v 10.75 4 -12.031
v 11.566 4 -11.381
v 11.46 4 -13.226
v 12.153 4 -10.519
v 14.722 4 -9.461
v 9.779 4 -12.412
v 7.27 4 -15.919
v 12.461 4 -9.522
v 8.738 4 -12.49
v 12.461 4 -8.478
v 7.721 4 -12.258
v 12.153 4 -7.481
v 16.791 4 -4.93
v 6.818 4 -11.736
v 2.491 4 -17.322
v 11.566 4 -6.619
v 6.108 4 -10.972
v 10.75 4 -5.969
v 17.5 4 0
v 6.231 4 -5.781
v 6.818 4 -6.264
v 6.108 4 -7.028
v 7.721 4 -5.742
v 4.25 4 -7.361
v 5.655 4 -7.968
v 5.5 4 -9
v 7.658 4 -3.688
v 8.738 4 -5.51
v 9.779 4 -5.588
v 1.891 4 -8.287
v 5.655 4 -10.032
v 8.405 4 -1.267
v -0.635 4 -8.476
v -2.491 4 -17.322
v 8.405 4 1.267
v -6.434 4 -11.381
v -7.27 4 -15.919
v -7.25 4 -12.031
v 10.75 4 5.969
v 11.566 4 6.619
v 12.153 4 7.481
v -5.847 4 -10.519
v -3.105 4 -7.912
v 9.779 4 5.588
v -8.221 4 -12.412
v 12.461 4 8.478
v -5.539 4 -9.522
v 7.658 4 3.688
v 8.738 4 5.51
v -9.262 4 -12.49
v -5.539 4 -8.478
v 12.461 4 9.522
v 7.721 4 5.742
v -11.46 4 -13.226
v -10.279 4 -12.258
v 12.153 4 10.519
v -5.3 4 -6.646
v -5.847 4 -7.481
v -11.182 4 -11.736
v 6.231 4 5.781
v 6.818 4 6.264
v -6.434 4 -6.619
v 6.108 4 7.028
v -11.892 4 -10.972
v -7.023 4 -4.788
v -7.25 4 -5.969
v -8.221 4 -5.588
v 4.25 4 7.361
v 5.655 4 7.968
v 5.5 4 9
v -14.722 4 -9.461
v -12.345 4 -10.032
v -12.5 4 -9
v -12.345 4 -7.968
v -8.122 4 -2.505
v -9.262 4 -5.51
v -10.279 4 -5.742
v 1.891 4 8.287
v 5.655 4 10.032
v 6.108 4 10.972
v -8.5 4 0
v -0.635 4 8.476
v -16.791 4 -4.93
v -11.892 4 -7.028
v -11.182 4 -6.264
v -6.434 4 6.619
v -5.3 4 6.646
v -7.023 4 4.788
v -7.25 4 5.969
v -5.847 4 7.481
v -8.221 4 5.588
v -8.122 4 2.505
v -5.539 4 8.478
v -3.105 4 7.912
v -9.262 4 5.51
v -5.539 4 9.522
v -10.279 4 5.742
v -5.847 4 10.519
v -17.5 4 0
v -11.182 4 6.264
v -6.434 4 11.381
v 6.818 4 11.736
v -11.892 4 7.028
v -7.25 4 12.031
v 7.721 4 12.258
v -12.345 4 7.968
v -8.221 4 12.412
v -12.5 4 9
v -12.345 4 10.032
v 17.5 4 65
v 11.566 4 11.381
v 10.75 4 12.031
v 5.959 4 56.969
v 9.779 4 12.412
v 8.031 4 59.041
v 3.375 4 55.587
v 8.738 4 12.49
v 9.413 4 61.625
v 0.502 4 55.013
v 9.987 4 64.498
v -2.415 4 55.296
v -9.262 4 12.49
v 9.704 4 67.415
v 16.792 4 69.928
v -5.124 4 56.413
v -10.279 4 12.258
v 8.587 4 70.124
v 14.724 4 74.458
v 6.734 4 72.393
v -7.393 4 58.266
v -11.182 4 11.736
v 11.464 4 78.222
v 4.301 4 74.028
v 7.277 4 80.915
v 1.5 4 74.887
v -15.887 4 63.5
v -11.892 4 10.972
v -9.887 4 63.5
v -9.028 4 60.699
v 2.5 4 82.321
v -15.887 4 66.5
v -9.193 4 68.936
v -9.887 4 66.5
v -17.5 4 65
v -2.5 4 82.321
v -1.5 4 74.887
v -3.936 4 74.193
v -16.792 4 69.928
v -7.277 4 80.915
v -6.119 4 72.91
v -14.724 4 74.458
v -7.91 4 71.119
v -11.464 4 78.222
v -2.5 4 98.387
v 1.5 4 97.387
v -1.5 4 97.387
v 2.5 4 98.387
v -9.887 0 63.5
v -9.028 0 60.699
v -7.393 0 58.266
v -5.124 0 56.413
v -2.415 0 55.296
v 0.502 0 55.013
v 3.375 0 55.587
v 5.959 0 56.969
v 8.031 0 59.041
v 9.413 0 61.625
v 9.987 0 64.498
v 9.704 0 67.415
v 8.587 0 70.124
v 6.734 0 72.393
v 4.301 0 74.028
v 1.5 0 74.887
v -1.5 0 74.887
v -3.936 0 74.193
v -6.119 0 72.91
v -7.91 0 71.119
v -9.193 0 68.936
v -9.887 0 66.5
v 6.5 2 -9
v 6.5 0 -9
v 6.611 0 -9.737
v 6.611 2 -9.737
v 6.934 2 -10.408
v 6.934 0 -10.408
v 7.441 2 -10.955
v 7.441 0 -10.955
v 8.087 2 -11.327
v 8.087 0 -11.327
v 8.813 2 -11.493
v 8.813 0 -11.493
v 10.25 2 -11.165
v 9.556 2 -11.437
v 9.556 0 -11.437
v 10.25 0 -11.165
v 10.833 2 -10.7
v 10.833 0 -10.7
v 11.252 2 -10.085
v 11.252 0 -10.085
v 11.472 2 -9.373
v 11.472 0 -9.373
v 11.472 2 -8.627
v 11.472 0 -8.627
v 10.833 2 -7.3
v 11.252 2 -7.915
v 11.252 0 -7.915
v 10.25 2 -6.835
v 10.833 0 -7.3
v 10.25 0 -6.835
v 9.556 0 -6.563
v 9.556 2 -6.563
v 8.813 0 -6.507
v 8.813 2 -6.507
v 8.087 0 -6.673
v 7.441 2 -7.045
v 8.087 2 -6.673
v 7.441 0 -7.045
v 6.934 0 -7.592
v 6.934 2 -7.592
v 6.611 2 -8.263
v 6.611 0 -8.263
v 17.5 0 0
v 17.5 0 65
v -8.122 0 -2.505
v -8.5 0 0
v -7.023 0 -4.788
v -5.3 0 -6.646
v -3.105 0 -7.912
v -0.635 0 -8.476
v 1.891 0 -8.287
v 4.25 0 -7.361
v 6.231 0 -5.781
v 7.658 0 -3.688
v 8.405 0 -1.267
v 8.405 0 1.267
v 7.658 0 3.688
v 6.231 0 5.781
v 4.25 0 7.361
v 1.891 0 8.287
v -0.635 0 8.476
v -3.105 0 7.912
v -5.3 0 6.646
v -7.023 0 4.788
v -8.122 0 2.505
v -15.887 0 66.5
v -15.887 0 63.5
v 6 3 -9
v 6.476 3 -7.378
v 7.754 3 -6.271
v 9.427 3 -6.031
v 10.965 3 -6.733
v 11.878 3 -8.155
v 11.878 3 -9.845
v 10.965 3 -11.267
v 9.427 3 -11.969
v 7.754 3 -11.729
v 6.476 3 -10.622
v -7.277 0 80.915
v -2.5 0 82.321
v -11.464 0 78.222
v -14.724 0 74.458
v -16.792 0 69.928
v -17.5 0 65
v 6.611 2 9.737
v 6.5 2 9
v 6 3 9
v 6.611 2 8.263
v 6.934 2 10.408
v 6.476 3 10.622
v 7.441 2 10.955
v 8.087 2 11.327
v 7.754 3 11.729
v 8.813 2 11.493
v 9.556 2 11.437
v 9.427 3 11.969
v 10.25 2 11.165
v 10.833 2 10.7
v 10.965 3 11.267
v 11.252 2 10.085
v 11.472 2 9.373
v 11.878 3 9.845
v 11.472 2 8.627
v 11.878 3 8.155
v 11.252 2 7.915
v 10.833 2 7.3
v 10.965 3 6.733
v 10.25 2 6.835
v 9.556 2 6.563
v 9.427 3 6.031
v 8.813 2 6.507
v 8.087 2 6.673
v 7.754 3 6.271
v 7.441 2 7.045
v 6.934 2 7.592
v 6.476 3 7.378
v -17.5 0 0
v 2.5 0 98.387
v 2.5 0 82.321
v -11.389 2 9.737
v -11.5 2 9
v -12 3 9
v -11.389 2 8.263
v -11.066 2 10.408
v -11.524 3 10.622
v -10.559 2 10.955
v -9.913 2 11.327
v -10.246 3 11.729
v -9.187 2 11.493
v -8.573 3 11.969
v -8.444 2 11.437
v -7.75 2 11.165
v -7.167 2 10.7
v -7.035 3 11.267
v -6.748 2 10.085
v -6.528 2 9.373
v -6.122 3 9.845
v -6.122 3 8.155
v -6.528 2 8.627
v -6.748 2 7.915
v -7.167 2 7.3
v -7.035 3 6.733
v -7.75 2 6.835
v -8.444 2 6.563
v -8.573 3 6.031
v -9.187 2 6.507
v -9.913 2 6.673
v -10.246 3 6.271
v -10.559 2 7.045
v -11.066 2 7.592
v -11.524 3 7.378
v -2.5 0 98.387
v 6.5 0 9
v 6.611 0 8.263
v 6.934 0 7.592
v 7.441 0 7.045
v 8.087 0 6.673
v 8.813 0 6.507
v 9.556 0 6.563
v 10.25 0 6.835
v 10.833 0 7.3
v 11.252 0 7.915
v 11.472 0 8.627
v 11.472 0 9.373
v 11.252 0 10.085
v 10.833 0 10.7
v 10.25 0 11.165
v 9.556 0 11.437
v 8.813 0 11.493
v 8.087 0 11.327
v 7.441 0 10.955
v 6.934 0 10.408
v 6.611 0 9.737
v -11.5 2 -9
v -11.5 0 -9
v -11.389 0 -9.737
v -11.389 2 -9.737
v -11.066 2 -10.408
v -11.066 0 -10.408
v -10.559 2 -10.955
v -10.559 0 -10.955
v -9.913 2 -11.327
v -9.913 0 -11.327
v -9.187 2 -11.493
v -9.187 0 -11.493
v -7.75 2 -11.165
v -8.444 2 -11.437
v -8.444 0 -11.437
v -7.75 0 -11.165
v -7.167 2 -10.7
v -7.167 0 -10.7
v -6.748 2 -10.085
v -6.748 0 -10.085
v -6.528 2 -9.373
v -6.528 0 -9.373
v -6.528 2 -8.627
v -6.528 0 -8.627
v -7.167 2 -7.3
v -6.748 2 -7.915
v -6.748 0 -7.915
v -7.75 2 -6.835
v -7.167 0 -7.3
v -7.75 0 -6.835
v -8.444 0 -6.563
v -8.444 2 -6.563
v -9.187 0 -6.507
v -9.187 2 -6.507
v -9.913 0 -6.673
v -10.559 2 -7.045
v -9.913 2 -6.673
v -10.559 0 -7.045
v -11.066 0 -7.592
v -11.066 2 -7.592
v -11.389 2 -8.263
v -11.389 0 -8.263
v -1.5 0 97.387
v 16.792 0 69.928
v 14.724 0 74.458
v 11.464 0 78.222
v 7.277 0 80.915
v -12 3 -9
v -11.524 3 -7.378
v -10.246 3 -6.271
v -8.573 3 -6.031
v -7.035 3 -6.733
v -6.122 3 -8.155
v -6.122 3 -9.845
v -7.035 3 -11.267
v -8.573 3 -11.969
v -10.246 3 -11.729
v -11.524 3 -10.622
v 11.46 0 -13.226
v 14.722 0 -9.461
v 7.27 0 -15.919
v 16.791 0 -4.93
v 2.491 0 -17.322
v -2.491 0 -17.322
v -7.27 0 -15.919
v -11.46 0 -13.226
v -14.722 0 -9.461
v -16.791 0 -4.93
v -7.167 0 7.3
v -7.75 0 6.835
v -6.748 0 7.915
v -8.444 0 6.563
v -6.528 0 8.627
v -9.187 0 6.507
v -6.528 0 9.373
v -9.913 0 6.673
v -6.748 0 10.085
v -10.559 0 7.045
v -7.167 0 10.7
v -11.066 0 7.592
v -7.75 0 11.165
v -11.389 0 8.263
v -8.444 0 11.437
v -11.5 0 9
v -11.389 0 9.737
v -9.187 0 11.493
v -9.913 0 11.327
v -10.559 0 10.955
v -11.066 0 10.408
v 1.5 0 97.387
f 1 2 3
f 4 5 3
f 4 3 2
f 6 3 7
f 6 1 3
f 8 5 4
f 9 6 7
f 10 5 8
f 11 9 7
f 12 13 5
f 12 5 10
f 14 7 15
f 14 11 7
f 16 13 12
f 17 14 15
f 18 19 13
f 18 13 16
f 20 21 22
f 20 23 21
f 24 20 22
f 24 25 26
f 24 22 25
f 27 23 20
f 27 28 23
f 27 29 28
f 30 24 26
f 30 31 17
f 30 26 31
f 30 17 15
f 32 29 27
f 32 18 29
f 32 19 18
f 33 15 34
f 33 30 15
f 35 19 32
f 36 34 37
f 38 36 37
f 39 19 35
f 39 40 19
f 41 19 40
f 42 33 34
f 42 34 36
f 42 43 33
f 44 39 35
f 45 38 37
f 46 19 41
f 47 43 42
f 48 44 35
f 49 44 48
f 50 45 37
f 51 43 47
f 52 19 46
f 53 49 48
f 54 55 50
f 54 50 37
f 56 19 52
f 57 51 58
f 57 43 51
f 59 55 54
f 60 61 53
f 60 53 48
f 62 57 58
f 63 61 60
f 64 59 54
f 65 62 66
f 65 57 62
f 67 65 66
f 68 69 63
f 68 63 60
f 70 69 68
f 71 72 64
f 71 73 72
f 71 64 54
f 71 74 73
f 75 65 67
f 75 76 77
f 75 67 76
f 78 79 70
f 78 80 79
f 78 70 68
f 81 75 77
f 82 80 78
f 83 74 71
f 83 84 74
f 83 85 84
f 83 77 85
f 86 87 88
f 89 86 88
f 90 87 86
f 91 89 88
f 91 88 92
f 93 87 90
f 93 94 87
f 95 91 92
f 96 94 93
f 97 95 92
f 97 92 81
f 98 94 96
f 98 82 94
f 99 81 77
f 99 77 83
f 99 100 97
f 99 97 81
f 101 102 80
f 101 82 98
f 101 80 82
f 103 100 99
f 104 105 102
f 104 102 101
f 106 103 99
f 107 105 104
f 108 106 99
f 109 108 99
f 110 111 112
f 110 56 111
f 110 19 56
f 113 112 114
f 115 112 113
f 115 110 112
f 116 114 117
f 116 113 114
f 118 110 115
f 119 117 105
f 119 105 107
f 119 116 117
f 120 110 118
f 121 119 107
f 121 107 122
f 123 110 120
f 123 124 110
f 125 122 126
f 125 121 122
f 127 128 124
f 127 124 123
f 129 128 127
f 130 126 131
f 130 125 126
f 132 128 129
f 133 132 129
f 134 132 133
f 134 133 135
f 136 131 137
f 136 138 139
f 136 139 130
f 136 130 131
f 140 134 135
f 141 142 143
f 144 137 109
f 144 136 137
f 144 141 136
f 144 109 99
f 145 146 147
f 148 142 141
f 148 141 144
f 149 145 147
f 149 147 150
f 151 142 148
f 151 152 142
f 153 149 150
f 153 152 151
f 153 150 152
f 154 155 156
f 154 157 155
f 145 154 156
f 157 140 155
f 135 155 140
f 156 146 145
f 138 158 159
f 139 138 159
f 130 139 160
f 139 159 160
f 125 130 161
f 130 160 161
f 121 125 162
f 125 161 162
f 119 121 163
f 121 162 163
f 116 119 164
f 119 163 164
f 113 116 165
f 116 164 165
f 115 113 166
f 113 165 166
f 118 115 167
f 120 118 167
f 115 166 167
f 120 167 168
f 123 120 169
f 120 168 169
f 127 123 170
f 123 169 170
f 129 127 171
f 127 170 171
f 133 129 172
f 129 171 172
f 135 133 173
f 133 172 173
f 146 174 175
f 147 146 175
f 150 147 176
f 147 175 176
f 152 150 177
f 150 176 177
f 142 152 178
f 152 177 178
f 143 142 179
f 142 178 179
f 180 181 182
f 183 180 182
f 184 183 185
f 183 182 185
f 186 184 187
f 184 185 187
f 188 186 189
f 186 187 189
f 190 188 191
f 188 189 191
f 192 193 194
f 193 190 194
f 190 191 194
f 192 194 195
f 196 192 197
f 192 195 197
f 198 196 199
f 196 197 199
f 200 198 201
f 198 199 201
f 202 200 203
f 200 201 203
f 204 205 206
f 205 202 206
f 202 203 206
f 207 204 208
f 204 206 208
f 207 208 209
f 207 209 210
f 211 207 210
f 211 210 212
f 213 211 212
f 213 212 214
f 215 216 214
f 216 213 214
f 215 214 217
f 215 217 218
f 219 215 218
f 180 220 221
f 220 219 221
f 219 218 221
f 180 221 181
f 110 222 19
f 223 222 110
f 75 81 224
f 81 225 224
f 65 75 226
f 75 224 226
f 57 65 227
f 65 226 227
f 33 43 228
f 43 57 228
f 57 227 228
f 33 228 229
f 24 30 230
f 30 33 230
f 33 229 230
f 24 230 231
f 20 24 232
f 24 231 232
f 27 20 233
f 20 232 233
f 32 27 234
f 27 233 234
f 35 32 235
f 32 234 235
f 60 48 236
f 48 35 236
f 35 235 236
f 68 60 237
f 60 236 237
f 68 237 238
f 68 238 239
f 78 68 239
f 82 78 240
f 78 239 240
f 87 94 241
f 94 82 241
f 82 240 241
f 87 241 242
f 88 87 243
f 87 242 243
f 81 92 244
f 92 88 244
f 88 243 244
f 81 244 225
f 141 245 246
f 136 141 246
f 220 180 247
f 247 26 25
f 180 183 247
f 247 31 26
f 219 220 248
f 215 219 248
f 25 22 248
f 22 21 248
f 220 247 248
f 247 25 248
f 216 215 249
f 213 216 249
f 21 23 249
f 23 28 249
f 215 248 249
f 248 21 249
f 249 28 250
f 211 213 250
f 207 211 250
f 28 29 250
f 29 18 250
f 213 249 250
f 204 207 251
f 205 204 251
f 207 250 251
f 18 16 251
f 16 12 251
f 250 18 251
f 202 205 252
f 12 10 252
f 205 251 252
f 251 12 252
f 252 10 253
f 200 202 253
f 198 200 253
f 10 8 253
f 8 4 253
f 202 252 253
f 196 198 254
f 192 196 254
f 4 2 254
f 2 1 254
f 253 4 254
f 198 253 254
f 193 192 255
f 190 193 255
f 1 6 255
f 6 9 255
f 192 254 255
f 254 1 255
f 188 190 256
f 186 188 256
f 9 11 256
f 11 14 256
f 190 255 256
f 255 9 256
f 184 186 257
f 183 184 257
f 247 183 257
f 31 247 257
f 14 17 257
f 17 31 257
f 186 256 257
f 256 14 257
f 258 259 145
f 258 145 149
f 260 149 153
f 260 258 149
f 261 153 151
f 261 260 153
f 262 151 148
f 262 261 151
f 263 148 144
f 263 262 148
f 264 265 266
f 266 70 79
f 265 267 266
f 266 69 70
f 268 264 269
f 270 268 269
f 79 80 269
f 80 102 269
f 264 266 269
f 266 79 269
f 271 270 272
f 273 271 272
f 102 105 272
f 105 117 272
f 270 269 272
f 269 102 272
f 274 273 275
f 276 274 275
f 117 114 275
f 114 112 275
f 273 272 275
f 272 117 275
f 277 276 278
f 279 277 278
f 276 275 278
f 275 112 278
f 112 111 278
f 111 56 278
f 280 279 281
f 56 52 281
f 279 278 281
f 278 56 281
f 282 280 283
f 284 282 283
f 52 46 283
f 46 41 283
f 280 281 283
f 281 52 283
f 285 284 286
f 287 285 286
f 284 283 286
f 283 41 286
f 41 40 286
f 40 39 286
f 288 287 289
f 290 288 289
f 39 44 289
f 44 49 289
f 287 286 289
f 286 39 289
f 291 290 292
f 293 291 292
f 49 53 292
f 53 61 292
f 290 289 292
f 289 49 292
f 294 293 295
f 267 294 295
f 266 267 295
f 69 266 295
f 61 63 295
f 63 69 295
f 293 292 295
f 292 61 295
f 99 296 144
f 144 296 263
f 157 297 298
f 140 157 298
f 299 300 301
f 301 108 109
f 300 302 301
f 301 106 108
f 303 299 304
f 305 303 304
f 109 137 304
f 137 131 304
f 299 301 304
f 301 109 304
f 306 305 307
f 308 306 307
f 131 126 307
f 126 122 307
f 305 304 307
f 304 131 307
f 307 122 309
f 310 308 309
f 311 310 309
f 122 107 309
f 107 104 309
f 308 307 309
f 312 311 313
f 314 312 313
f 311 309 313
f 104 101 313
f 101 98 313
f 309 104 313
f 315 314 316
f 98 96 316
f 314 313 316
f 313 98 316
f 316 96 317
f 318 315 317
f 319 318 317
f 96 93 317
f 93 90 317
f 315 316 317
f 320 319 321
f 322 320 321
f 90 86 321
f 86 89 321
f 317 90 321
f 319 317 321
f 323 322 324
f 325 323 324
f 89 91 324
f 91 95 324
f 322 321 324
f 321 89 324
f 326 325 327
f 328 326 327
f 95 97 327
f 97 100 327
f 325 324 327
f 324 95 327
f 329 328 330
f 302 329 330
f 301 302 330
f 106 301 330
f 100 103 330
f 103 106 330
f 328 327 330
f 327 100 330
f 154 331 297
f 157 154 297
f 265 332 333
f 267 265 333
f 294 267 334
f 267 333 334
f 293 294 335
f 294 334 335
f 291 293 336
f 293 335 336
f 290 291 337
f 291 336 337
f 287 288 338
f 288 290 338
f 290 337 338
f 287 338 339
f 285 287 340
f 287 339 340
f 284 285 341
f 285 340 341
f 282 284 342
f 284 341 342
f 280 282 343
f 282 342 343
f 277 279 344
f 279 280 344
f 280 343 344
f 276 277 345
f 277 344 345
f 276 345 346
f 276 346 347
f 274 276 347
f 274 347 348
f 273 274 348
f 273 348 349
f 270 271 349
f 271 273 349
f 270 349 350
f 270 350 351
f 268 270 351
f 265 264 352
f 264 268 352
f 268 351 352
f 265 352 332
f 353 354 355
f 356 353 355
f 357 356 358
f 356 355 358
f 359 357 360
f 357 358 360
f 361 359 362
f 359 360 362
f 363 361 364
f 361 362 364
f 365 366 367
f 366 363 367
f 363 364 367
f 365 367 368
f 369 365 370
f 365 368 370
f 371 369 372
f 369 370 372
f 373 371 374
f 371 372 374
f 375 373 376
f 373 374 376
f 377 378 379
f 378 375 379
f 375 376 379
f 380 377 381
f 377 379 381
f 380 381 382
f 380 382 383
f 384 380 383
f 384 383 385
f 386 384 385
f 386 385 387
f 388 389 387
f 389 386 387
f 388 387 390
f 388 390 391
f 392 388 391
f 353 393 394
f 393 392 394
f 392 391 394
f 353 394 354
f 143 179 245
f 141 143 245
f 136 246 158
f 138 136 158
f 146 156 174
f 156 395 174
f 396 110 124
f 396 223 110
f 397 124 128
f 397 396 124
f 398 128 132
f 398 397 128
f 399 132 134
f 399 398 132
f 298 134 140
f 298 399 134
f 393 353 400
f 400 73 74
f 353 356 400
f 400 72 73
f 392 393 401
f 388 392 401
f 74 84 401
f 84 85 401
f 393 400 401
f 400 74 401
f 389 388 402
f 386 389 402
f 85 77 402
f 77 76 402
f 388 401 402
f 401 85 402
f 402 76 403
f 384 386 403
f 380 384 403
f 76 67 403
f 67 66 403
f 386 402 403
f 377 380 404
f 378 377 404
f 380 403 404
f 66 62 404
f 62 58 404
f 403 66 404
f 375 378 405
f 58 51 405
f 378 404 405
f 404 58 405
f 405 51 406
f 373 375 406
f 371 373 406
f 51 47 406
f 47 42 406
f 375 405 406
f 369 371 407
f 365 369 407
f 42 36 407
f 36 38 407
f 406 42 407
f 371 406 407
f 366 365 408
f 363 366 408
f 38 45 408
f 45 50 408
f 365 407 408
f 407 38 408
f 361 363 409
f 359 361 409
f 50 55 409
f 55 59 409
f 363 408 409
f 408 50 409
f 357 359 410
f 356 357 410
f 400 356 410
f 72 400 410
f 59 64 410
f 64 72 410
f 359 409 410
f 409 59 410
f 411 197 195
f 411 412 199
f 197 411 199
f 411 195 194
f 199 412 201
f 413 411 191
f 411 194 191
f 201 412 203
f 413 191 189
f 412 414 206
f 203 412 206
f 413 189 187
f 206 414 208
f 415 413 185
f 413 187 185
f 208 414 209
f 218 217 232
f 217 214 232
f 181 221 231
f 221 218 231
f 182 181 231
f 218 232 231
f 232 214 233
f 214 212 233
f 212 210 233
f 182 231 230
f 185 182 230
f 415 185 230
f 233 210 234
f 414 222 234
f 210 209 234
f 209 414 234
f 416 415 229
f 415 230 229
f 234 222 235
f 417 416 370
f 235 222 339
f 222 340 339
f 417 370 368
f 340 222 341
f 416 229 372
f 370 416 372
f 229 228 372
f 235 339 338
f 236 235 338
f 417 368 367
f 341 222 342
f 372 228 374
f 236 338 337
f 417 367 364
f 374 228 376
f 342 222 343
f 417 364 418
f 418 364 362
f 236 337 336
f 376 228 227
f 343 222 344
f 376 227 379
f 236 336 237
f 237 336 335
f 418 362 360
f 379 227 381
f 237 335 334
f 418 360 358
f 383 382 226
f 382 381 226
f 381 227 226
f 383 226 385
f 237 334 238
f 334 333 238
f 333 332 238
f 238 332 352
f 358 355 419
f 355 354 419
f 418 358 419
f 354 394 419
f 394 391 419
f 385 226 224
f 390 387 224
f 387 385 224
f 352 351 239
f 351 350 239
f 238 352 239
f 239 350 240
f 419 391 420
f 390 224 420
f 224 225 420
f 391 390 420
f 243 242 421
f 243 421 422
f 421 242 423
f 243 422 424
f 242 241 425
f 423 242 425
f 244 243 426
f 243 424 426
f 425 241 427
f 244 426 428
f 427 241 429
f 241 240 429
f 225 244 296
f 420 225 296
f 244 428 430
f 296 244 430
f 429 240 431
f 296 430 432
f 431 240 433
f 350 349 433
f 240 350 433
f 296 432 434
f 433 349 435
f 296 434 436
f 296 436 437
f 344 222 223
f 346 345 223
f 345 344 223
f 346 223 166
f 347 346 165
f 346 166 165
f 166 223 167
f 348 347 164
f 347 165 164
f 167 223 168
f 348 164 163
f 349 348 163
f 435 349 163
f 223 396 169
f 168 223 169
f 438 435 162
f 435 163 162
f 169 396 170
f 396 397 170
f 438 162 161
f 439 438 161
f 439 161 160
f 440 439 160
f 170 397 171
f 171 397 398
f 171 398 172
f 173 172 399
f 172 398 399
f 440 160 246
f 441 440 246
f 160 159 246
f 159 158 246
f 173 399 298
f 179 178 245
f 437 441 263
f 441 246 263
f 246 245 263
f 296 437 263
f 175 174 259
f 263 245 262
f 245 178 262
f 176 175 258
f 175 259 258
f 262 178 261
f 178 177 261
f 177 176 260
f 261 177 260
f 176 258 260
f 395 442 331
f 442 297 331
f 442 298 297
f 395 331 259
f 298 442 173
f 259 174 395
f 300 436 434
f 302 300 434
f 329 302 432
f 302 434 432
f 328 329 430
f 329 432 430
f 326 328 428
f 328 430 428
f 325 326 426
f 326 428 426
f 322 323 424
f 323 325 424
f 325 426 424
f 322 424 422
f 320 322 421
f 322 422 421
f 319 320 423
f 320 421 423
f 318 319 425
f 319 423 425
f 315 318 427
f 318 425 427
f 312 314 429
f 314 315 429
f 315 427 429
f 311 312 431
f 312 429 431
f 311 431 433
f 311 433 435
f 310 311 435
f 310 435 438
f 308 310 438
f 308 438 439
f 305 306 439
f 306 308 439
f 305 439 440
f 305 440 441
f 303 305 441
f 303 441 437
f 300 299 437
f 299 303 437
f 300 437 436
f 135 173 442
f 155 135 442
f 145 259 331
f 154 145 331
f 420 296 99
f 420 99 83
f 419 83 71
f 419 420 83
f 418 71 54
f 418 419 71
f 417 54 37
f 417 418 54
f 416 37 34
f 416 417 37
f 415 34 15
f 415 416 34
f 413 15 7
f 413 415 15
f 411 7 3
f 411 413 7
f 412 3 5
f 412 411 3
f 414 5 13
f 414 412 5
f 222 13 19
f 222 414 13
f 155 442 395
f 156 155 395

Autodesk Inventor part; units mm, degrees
ref_plane "YZ Plane" through (0, 0, 0) normal (1, 0, 0) x (0, 1, 0)
ref_plane "XZ Plane" through (0, 0, 0) normal (0, 1, 0) x (-1, 0, 0)
ref_plane "XY Plane" through (0, 0, 0) normal (0, 0, 1) x (1, 0, 0)
sketch "Esquisse3" plane through (0, 0, 0) normal (0, 1, 0) x (-1, 0, 0)
  line L0 (-6.5, 6.5) -> (6.5, 6.5) construction
  line L1 (6.5, 6.5) -> (6.5, -6.5) construction
  line L2 (6.5, -6.5) -> (-6.5, -6.5) construction
  line L3 (-6.5, -6.5) -> (-6.5, 6.5) construction
  line L4 (-6.5, 6.5) -> (6.5, -6.5) construction
  line L5 (6.5, 6.5) -> (-6.5, -6.5) construction
  line L6 (-11.5, 11.5) -> (11.5, 11.5) construction
  line L7 (11.5, 11.5) -> (11.5, -11.5) construction
  line L8 (11.5, -11.5) -> (-11.5, -11.5) construction
  line L9 (-11.5, -11.5) -> (-11.5, 11.5) construction
  line L10 (-11.5, 11.5) -> (11.5, -11.5) construction
  line L11 (11.5, 11.5) -> (-11.5, -11.5) construction
  line L12 (-6.5, 6.5) -> (-11.5, 6.5) construction
  line L13 (-11.5, 6.5) -> (-11.5, 11.5) construction
  line L14 (-11.5, 11.5) -> (-6.5, 11.5) construction
  line L15 (-6.5, 11.5) -> (-6.5, 6.5) construction
  line L16 (-6.5, -6.5) -> (-11.5, -6.5) construction
  line L17 (-11.5, -6.5) -> (-11.5, -11.5) construction
  line L18 (-11.5, -11.5) -> (-6.5, -11.5) construction
  line L19 (-6.5, -11.5) -> (-6.5, -6.5) construction
  line L20 (6.5, -6.5) -> (11.5, -6.5) construction
  line L21 (11.5, -6.5) -> (11.5, -11.5) construction
  line L22 (11.5, -11.5) -> (6.5, -11.5) construction
  line L23 (6.5, -11.5) -> (6.5, -6.5) construction
  line L24 (11.5, 11.5) -> (6.5, 11.5) construction
  line L25 (6.5, 11.5) -> (6.5, 6.5) construction
  line L26 (6.5, 6.5) -> (11.5, 6.5) construction
  line L27 (11.5, 6.5) -> (11.5, 11.5) construction
  circle A0 centre (9, 9) radius 2.5
  circle A1 centre (9, -9) radius 2.5
  circle A2 centre (-9, -9) radius 2.5
  circle A3 centre (-9, 9) radius 2.5
  circle A4 centre (0, 0) radius 17.5
  circle A5 centre (0, 0) radius 8.5
  line L28 (17.5, 0) -> (17.5, 65)
  line L29 (-17.5, 0) -> (-17.5, 65)
  line L30 (0, -17.5) -> (0, 82.5) construction
  circle A6 centre (0, 65) radius 17.5
  circle A7 centre (0, 65) radius 10
  line L31 (1.5, 74.8869) -> (-1.5, 74.8869)
  line L32 (-1.5, 74.8869) -> (-1.5, 97.3869)
  line L33 (-1.5, 97.3869) -> (1.5, 97.3869)
  line L34 (1.5, 97.3869) -> (1.5, 74.8869)
  line L35 (-2.5, 98.3869) -> (-2.5, 73.8869)
  line L36 (-2.5, 73.8869) -> (2.5, 73.8869)
  line L37 (2.5, 73.8869) -> (2.5, 98.3869)
  line L38 (2.5, 98.3869) -> (-2.5, 98.3869)
  line L39 (15.8869, 63.5) -> (9.8869, 63.5)
  line L40 (9.8869, 63.5) -> (9.8869, 66.5)
  line L41 (9.8869, 66.5) -> (15.8869, 66.5)
  line L42 (15.8869, 66.5) -> (15.8869, 63.5)
  point P0 (17.5, 63.5)
  point P1 (17.4356, 66.5)
  point P2 (2.5, 82.3205)
  point P3 (-2.5, 82.3205)
  point P4 (1.5, 82.4356)
  point P5 (-1.5, 82.4356)
  point P6 (-2.5, 74.6825)
  point P7 (2.5, 74.6825)
  dimension "d1" = 13
  dimension "d2" = 13
  dimension "d3" = 5
  dimension "d4" = 35
  dimension "d9" = 9
  dimension "d29" = 100
  dimension "d31" = 35
  dimension "d32" = 20
  dimension "d33" = 3
  dimension "d34" = 22.5
  dimension "d36" = 1
  dimension "d37" = 3
  dimension "d51" = 6
extrude "Extrusion1" add sketch "Esquisse3" along normal blind 4 contours A4 | A4 L29 A6 L28 | A6 L35 A7 L39 L42 L41 L37 | L37 A7 L34 A6 | A6 L34 L33 L32 L35 L38 L37 | A6 L32 A7 L35
chamfer "Chanfrein5" distance 1 distance2 2 1 edges at (11.5, 4, -9) measured on face at (0.0538, 4, 25.8921)
chamfer "Chanfrein6" distance 1 distance2 2 1 edges at (-6.5, 4, -9) measured on face at (0.0538, 4, 25.8921)
chamfer "Chanfrein7" distance 1 distance2 2 1 edges at (-6.5, 4, 9) measured on face at (0.0538, 4, 25.8921)
chamfer "Chanfrein8" distance 1 distance2 2 1 edges at (11.5, 4, 9) measured on face at (0.172, 4, 26.2038)
properties part number "Pièce_moteur_maintient_test_4"
